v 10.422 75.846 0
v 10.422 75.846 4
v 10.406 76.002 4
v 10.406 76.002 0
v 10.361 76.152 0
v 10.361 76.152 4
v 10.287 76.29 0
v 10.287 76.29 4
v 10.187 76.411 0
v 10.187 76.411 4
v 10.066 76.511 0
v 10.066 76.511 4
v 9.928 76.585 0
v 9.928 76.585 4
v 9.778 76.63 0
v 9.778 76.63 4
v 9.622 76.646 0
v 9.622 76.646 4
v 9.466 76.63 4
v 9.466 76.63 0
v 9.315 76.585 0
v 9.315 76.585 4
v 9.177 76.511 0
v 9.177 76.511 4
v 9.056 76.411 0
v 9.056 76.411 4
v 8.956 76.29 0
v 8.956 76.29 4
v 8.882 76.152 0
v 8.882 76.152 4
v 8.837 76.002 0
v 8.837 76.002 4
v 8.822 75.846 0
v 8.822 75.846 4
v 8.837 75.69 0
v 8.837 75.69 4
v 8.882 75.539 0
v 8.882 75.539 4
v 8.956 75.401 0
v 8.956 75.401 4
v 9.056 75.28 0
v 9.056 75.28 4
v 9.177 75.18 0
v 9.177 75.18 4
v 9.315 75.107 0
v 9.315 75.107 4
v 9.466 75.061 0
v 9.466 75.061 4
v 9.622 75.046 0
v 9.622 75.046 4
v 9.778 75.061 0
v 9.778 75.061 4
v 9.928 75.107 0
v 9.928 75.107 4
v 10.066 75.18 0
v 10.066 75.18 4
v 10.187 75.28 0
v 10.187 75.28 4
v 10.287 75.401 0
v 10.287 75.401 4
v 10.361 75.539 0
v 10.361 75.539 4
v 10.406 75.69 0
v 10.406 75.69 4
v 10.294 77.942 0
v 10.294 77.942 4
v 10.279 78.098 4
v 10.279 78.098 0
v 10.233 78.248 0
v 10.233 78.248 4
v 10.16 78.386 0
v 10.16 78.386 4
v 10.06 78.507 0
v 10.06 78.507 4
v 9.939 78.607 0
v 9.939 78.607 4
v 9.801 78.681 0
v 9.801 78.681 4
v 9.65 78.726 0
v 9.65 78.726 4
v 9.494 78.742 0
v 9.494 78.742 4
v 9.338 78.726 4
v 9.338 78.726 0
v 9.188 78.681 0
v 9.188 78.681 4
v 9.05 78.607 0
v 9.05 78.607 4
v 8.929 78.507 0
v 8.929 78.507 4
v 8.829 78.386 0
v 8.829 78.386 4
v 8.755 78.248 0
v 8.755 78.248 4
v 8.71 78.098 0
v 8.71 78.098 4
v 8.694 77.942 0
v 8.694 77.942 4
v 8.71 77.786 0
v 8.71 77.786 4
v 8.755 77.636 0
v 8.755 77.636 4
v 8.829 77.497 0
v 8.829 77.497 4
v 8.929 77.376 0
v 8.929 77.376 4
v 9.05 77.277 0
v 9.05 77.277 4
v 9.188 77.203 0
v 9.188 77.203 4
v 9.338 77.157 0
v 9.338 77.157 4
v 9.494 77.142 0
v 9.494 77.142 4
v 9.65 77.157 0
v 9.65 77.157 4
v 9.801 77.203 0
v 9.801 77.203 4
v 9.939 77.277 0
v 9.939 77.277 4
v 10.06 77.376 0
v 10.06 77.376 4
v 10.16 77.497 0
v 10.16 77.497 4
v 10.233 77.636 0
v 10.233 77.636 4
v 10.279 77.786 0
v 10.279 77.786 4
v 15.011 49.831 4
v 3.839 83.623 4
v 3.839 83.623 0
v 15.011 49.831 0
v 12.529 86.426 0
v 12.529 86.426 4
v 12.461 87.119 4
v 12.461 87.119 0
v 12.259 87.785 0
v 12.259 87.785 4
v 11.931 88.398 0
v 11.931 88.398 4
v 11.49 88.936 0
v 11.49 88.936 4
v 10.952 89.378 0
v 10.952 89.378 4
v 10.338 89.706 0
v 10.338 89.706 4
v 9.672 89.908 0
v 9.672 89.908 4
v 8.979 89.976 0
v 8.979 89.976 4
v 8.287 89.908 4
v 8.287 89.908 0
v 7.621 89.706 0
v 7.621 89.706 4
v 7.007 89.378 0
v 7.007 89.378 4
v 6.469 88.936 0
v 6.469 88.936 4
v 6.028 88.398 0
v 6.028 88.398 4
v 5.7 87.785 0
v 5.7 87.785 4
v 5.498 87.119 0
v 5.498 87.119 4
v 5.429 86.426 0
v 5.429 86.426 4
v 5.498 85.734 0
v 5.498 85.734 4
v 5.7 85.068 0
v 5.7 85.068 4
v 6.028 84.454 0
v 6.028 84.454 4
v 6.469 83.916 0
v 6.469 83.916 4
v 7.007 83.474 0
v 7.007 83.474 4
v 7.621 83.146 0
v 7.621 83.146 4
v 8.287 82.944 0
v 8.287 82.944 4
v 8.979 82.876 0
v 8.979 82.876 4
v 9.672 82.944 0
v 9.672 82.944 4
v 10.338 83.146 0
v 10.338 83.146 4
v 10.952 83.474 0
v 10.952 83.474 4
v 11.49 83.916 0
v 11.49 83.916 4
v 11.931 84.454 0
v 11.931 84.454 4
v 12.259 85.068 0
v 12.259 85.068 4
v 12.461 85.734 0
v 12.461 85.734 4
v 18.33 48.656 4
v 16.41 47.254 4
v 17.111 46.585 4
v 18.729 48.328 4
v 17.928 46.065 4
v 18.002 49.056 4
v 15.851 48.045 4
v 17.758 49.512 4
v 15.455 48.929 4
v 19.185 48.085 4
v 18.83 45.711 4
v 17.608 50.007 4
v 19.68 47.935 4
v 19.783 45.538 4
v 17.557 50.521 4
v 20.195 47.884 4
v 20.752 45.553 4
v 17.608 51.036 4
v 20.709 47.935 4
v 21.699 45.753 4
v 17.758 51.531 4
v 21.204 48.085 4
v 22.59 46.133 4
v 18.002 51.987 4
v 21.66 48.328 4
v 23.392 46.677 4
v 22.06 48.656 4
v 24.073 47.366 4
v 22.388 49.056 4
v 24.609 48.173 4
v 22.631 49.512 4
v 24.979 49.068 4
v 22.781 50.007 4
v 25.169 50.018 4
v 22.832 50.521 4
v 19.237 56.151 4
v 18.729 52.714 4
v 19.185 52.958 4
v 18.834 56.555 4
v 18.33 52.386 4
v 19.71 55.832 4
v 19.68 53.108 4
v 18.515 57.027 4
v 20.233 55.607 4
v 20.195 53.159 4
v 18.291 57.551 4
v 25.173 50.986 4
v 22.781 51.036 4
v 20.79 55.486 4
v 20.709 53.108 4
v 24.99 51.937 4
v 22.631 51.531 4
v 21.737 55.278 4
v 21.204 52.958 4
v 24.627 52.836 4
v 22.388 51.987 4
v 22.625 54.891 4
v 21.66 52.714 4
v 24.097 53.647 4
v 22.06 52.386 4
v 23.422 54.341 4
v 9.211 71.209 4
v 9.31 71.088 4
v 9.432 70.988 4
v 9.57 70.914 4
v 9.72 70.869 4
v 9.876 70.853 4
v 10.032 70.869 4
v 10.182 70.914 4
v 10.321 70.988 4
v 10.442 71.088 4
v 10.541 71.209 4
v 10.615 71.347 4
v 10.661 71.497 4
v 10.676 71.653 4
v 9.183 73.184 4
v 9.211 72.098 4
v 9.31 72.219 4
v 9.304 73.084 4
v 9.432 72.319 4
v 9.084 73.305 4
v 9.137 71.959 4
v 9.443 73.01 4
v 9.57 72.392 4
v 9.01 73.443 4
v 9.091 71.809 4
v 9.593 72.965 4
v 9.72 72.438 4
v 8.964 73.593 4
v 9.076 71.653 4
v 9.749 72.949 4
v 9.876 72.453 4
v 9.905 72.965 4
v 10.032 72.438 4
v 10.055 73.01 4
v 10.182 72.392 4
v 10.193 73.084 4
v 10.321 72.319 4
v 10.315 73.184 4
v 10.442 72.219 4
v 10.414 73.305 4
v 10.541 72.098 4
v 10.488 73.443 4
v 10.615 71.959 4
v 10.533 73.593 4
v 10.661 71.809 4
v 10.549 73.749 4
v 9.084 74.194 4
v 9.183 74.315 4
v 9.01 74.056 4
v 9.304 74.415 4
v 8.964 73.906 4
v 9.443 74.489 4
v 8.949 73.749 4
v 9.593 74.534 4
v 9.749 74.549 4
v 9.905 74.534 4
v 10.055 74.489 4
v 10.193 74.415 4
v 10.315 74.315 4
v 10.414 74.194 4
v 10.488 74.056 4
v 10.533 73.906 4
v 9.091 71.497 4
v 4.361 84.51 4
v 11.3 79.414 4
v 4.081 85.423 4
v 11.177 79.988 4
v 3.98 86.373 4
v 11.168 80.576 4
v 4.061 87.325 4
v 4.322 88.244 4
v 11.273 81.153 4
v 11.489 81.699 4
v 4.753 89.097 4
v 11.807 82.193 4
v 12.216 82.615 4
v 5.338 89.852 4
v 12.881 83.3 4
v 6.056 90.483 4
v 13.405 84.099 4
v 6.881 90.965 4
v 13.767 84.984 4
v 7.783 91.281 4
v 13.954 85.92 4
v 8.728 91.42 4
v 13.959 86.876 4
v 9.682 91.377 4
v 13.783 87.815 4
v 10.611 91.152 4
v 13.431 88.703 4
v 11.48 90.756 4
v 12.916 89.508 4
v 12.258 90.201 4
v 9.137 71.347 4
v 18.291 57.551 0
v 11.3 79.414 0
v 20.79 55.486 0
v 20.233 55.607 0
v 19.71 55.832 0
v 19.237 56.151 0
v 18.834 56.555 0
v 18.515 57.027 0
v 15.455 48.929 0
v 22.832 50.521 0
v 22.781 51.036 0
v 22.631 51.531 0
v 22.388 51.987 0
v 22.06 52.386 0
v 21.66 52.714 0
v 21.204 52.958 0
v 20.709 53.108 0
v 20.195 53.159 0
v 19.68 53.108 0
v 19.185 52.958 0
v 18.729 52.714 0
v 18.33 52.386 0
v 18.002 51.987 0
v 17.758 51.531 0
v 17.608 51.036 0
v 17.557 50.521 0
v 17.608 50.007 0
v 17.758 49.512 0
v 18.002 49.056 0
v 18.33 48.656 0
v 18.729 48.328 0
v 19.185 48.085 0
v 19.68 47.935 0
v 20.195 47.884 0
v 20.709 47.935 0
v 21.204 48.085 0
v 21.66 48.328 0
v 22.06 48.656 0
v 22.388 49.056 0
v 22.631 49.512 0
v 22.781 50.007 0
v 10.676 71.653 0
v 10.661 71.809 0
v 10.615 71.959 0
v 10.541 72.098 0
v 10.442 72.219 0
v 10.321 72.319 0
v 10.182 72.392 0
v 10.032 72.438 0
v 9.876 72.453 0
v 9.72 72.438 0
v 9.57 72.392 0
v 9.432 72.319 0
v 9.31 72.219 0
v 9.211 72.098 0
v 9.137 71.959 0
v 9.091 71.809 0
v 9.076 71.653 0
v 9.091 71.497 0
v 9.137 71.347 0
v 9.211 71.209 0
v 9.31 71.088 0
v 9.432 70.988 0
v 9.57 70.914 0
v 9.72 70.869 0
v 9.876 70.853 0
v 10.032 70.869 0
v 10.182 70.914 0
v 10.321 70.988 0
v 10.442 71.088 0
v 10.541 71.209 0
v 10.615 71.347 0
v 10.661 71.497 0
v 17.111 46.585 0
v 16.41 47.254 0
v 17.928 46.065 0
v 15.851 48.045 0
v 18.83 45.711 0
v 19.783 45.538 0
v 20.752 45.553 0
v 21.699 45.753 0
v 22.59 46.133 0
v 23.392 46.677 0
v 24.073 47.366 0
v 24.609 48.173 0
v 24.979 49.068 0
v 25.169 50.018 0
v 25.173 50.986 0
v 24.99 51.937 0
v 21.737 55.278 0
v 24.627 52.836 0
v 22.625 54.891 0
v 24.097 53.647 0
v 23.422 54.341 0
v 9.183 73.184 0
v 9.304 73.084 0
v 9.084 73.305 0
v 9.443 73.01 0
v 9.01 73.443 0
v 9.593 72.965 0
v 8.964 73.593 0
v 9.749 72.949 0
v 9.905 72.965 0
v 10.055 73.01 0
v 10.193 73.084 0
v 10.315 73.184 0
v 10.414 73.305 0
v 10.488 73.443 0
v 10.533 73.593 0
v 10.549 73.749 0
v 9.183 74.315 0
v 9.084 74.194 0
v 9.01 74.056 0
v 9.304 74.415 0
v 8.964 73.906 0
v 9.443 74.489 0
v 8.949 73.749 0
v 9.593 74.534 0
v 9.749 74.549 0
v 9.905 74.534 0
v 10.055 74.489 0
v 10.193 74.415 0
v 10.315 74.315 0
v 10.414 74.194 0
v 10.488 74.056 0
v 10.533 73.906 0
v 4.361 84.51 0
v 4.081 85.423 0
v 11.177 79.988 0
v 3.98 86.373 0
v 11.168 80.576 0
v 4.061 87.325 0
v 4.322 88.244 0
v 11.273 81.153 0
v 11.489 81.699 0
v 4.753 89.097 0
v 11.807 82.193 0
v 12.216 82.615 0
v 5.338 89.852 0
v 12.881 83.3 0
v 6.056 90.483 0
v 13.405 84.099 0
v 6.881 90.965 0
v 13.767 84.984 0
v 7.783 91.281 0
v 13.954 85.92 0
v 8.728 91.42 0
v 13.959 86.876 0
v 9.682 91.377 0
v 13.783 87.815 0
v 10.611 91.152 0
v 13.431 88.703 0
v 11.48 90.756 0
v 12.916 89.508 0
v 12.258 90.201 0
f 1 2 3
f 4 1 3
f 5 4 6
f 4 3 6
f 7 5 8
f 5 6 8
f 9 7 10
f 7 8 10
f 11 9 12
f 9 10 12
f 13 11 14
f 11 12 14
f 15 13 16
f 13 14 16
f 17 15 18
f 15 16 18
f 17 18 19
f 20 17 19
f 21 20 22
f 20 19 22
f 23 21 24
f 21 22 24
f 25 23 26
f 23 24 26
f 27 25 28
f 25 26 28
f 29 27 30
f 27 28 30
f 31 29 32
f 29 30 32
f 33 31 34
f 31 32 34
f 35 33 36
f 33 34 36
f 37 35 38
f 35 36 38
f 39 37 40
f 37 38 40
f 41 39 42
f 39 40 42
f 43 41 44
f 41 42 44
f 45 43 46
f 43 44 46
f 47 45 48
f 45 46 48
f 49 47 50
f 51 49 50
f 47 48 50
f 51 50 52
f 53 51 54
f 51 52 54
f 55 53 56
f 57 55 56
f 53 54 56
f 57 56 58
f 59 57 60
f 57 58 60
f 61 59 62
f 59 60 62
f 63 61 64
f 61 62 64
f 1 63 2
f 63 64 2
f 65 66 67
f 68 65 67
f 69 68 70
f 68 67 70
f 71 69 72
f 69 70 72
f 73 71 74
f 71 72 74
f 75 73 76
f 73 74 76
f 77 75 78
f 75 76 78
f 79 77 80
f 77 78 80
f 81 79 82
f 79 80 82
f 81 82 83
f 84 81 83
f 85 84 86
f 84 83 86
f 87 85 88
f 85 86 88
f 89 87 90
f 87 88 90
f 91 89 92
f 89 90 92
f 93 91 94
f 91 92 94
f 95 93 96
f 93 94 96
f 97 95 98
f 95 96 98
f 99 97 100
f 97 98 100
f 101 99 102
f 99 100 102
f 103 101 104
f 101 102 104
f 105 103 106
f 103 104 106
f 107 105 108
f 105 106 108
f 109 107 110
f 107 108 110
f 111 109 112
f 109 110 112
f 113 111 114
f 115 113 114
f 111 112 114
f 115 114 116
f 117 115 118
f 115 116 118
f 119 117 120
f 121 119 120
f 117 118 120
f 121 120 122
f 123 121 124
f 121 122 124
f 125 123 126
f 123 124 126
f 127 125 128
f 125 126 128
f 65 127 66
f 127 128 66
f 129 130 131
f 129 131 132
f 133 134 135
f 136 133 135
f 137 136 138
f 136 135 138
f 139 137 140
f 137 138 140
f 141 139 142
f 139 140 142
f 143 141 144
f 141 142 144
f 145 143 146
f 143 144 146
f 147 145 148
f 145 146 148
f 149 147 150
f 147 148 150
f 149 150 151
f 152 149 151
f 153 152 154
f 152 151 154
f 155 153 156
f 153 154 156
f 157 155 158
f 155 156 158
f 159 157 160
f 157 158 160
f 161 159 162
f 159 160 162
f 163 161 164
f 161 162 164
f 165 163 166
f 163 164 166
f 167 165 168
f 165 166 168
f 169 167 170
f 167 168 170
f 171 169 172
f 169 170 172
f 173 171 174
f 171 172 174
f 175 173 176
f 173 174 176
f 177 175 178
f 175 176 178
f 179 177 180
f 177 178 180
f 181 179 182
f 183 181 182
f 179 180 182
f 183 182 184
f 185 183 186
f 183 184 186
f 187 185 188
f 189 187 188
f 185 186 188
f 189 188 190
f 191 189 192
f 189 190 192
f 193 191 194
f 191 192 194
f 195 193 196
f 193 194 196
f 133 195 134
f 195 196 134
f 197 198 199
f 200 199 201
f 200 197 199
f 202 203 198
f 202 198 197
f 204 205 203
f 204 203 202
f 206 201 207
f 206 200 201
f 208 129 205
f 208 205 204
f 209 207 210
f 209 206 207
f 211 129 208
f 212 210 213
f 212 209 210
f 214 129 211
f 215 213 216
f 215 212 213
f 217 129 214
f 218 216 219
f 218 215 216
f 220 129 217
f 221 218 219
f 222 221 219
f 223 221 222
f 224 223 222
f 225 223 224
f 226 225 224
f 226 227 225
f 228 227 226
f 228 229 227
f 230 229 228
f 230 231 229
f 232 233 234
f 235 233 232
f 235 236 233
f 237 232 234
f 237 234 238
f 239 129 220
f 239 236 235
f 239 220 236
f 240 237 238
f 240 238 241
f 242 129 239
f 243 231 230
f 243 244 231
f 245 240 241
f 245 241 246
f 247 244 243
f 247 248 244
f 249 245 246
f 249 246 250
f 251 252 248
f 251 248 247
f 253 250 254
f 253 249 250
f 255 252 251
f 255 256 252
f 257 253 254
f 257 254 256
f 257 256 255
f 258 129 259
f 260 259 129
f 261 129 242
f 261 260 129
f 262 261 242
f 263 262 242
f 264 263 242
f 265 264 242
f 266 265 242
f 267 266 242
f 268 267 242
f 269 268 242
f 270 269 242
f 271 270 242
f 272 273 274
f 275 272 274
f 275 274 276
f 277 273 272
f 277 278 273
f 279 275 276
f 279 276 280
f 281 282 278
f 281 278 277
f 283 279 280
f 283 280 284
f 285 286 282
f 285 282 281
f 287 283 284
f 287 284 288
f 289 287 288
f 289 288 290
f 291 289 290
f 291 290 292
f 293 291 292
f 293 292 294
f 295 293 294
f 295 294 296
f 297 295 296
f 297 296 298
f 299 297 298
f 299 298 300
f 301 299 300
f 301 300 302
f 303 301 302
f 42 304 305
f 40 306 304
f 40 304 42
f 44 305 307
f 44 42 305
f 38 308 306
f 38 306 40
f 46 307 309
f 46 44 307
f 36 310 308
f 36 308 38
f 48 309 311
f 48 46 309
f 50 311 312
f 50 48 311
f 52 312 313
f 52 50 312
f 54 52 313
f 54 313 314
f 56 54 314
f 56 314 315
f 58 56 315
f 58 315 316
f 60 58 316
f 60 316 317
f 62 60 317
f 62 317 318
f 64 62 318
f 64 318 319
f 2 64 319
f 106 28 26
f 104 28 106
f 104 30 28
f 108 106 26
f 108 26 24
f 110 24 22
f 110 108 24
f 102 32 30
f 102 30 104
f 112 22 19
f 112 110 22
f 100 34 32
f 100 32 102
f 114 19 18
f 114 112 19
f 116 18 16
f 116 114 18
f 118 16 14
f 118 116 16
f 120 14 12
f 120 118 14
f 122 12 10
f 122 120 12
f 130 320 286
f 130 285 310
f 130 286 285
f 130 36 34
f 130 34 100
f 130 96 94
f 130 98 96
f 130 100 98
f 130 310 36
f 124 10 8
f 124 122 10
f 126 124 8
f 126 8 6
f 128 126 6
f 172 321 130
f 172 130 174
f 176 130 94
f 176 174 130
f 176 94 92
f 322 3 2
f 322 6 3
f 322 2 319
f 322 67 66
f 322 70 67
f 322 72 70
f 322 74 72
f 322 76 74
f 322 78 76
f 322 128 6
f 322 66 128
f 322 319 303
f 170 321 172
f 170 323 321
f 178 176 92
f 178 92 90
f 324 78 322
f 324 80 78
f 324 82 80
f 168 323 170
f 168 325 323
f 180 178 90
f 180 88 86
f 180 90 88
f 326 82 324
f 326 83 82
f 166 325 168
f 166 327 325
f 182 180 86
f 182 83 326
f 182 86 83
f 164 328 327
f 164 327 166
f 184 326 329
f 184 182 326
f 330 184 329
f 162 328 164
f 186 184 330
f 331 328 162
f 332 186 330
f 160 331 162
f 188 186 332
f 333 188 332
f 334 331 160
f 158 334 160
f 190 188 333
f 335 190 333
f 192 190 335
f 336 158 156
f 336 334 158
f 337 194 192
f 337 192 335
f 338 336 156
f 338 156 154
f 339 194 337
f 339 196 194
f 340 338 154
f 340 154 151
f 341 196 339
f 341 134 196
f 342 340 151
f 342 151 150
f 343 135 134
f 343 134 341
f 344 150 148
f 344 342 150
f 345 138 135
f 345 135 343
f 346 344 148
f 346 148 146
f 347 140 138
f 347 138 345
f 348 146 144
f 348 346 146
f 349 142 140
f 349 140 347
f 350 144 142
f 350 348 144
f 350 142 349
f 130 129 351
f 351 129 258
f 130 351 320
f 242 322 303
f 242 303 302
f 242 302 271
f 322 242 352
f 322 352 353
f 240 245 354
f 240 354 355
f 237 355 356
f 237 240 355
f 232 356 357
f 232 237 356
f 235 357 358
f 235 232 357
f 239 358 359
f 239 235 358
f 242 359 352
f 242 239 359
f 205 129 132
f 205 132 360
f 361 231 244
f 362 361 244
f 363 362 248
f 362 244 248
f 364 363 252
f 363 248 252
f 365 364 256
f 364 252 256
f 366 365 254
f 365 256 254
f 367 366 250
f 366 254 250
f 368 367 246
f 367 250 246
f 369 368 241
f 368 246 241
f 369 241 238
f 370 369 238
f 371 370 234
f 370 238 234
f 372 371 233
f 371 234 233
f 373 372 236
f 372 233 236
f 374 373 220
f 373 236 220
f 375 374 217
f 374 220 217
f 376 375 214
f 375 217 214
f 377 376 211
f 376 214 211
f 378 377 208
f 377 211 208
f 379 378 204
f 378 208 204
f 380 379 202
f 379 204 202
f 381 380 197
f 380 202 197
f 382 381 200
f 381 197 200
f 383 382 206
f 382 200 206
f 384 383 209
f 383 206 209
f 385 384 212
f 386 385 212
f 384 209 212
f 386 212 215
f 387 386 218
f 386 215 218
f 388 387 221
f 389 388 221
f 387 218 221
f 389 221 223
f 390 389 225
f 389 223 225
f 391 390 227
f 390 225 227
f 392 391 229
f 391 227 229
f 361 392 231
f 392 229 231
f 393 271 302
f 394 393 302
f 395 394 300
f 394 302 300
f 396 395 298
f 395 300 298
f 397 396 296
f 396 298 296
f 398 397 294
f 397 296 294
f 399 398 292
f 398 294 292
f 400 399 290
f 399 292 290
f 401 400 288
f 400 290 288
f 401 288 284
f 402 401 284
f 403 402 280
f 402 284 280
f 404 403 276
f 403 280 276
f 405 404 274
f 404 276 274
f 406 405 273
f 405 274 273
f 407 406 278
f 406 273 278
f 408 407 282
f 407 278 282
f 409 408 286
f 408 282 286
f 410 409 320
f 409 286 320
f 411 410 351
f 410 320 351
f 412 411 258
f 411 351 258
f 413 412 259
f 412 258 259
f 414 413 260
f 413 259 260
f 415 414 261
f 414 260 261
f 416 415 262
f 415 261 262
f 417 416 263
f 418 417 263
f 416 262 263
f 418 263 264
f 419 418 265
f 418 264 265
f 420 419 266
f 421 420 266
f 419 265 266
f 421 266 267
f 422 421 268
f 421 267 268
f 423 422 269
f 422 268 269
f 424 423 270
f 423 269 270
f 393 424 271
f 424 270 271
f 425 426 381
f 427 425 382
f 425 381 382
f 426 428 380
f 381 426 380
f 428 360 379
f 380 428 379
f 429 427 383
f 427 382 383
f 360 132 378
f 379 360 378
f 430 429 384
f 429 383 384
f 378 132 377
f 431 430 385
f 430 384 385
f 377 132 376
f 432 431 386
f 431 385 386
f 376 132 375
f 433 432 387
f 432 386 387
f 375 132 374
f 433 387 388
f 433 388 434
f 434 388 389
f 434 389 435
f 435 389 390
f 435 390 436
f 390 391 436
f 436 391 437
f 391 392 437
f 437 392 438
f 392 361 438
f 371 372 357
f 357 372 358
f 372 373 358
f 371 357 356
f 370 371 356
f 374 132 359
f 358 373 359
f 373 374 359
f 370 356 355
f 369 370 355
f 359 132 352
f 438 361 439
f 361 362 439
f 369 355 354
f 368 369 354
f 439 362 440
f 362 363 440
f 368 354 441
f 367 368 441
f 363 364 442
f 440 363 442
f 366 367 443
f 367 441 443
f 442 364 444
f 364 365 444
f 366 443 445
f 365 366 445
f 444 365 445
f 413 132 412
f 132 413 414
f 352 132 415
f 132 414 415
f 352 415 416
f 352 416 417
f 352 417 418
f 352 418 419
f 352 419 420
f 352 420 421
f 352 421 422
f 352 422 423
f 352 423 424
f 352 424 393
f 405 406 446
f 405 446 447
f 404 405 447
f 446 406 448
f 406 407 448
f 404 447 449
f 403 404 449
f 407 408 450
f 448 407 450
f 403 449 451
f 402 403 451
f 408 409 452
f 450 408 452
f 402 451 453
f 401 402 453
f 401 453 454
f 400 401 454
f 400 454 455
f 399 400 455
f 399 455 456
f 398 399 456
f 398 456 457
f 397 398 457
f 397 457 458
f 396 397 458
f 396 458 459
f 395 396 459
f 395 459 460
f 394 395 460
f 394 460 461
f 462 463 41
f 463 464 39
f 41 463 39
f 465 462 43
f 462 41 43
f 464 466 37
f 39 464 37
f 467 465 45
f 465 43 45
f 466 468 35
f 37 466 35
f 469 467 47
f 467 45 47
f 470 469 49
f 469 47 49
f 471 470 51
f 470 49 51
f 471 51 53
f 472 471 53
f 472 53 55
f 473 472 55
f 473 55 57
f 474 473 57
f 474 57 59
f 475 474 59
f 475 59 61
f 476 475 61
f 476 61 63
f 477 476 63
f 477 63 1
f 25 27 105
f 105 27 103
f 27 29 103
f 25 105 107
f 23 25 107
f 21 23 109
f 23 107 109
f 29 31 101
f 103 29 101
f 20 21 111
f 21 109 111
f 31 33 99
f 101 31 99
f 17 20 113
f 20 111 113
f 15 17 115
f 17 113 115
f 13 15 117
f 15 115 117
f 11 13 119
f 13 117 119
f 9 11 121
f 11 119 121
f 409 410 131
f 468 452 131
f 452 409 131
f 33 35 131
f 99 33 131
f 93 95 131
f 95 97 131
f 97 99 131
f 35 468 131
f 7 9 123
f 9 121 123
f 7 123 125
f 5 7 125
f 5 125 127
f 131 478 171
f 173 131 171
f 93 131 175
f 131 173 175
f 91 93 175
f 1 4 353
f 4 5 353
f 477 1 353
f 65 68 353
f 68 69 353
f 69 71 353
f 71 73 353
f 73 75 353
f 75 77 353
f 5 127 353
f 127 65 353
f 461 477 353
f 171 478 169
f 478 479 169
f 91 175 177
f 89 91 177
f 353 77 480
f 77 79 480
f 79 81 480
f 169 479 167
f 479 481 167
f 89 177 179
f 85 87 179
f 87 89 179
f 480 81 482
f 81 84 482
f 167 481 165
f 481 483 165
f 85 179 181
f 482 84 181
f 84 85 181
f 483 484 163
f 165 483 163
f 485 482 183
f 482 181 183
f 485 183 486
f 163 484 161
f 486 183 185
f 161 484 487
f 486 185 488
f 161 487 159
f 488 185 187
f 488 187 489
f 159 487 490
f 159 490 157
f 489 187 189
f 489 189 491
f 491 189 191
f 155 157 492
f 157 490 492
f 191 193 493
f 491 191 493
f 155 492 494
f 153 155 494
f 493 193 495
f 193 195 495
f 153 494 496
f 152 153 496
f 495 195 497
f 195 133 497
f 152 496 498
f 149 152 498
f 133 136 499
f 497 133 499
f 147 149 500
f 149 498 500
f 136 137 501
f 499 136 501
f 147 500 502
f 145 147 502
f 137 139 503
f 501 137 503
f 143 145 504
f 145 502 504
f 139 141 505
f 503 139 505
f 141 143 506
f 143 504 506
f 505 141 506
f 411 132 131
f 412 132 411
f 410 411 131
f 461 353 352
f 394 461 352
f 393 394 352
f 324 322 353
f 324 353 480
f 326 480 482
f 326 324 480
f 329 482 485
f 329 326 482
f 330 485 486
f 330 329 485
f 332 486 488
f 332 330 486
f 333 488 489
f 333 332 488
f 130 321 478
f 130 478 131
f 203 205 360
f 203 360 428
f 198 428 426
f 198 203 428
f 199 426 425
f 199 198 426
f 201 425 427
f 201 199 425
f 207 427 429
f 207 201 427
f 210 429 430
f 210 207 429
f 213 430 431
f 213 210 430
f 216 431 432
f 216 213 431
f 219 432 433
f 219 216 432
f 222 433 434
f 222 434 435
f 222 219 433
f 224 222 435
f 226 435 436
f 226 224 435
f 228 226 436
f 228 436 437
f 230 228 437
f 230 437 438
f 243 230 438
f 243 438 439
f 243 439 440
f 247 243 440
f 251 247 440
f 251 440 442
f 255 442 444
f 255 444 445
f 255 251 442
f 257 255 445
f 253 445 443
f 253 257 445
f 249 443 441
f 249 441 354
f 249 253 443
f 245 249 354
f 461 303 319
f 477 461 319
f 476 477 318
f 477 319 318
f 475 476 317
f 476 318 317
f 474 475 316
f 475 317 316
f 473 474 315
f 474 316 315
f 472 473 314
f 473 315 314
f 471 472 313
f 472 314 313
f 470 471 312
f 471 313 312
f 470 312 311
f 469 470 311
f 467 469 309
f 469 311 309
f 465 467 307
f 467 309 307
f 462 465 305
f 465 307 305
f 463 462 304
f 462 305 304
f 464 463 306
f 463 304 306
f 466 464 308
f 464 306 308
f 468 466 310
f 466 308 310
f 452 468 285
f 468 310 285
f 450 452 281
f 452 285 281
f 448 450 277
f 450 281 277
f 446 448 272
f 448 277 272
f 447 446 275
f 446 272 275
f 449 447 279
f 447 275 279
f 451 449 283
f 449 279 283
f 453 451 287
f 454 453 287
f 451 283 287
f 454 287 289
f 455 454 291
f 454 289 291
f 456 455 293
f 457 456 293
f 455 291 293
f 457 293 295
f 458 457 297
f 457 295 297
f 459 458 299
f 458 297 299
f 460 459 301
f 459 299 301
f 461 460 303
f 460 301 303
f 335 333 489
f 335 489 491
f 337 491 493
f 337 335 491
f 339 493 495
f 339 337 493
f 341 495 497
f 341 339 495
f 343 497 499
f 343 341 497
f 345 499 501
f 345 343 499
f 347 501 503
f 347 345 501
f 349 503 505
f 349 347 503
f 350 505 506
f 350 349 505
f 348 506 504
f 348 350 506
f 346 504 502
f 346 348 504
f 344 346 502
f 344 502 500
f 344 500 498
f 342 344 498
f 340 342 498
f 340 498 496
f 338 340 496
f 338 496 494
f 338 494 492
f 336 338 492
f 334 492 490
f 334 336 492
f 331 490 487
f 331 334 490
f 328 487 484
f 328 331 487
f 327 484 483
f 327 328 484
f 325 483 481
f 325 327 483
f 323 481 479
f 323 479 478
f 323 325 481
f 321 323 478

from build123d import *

# Parameters (mm, degrees)
SKETCH1_R           = 2.6375
SKETCH1_R_2         = 3.55
SKETCH1_R_3         = 0.8
BOSS_EXTRUDE1_DEPTH = 4


with BuildPart() as part:
    # Sketch1 → Boss-Extrude1 (new body)
    with BuildSketch(Plane.XY.offset(4)):
        with BuildLine():
            Line((4.361186649, 84.509770663), (3.838692378, 83.622901822))
            Line((3.838692378, 83.622901822), (15.011053362, 49.830662375))
            Line((15.011053362, 49.830662375), (15.45509163, 48.928599175))
            ThreePointArc((15.45509163, 48.928599175), (24.07294723, 47.365734356), (20.790472779, 55.485792426))
            ThreePointArc((20.790472779, 55.485792426), (19.237477826, 56.151424967), (18.290512878, 57.550752445))
            Line((18.290512878, 57.550752445), (11.299825408, 79.414245507))
            ThreePointArc((11.299825408, 79.414245507), (11.27305415, 81.153168904), (12.215576399, 82.614751297))
            ThreePointArc((12.215576399, 82.614751297), (10.152046635, 91.286695043), (4.361186649, 84.509770663))
        make_face()
        with Locations((20.194596002, 50.521426317)):
            Circle(SKETCH1_R, mode=Mode.SUBTRACT)
        with Locations((8.979351439, 86.426161535)):
            Circle(SKETCH1_R_2, mode=Mode.SUBTRACT)
        with Locations((9.4943608, 77.941777919)):
            Circle(SKETCH1_R_3, mode=Mode.SUBTRACT)
        with Locations((9.621598406, 75.845636084)):
            Circle(SKETCH1_R_3, mode=Mode.SUBTRACT)
        with Locations((9.748836013, 73.749494249)):
            Circle(SKETCH1_R_3, mode=Mode.SUBTRACT)
        with Locations((9.87607362, 71.653352414)):
            Circle(SKETCH1_R_3, mode=Mode.SUBTRACT)
    extrude(amount=-BOSS_EXTRUDE1_DEPTH)


solid = part.part
